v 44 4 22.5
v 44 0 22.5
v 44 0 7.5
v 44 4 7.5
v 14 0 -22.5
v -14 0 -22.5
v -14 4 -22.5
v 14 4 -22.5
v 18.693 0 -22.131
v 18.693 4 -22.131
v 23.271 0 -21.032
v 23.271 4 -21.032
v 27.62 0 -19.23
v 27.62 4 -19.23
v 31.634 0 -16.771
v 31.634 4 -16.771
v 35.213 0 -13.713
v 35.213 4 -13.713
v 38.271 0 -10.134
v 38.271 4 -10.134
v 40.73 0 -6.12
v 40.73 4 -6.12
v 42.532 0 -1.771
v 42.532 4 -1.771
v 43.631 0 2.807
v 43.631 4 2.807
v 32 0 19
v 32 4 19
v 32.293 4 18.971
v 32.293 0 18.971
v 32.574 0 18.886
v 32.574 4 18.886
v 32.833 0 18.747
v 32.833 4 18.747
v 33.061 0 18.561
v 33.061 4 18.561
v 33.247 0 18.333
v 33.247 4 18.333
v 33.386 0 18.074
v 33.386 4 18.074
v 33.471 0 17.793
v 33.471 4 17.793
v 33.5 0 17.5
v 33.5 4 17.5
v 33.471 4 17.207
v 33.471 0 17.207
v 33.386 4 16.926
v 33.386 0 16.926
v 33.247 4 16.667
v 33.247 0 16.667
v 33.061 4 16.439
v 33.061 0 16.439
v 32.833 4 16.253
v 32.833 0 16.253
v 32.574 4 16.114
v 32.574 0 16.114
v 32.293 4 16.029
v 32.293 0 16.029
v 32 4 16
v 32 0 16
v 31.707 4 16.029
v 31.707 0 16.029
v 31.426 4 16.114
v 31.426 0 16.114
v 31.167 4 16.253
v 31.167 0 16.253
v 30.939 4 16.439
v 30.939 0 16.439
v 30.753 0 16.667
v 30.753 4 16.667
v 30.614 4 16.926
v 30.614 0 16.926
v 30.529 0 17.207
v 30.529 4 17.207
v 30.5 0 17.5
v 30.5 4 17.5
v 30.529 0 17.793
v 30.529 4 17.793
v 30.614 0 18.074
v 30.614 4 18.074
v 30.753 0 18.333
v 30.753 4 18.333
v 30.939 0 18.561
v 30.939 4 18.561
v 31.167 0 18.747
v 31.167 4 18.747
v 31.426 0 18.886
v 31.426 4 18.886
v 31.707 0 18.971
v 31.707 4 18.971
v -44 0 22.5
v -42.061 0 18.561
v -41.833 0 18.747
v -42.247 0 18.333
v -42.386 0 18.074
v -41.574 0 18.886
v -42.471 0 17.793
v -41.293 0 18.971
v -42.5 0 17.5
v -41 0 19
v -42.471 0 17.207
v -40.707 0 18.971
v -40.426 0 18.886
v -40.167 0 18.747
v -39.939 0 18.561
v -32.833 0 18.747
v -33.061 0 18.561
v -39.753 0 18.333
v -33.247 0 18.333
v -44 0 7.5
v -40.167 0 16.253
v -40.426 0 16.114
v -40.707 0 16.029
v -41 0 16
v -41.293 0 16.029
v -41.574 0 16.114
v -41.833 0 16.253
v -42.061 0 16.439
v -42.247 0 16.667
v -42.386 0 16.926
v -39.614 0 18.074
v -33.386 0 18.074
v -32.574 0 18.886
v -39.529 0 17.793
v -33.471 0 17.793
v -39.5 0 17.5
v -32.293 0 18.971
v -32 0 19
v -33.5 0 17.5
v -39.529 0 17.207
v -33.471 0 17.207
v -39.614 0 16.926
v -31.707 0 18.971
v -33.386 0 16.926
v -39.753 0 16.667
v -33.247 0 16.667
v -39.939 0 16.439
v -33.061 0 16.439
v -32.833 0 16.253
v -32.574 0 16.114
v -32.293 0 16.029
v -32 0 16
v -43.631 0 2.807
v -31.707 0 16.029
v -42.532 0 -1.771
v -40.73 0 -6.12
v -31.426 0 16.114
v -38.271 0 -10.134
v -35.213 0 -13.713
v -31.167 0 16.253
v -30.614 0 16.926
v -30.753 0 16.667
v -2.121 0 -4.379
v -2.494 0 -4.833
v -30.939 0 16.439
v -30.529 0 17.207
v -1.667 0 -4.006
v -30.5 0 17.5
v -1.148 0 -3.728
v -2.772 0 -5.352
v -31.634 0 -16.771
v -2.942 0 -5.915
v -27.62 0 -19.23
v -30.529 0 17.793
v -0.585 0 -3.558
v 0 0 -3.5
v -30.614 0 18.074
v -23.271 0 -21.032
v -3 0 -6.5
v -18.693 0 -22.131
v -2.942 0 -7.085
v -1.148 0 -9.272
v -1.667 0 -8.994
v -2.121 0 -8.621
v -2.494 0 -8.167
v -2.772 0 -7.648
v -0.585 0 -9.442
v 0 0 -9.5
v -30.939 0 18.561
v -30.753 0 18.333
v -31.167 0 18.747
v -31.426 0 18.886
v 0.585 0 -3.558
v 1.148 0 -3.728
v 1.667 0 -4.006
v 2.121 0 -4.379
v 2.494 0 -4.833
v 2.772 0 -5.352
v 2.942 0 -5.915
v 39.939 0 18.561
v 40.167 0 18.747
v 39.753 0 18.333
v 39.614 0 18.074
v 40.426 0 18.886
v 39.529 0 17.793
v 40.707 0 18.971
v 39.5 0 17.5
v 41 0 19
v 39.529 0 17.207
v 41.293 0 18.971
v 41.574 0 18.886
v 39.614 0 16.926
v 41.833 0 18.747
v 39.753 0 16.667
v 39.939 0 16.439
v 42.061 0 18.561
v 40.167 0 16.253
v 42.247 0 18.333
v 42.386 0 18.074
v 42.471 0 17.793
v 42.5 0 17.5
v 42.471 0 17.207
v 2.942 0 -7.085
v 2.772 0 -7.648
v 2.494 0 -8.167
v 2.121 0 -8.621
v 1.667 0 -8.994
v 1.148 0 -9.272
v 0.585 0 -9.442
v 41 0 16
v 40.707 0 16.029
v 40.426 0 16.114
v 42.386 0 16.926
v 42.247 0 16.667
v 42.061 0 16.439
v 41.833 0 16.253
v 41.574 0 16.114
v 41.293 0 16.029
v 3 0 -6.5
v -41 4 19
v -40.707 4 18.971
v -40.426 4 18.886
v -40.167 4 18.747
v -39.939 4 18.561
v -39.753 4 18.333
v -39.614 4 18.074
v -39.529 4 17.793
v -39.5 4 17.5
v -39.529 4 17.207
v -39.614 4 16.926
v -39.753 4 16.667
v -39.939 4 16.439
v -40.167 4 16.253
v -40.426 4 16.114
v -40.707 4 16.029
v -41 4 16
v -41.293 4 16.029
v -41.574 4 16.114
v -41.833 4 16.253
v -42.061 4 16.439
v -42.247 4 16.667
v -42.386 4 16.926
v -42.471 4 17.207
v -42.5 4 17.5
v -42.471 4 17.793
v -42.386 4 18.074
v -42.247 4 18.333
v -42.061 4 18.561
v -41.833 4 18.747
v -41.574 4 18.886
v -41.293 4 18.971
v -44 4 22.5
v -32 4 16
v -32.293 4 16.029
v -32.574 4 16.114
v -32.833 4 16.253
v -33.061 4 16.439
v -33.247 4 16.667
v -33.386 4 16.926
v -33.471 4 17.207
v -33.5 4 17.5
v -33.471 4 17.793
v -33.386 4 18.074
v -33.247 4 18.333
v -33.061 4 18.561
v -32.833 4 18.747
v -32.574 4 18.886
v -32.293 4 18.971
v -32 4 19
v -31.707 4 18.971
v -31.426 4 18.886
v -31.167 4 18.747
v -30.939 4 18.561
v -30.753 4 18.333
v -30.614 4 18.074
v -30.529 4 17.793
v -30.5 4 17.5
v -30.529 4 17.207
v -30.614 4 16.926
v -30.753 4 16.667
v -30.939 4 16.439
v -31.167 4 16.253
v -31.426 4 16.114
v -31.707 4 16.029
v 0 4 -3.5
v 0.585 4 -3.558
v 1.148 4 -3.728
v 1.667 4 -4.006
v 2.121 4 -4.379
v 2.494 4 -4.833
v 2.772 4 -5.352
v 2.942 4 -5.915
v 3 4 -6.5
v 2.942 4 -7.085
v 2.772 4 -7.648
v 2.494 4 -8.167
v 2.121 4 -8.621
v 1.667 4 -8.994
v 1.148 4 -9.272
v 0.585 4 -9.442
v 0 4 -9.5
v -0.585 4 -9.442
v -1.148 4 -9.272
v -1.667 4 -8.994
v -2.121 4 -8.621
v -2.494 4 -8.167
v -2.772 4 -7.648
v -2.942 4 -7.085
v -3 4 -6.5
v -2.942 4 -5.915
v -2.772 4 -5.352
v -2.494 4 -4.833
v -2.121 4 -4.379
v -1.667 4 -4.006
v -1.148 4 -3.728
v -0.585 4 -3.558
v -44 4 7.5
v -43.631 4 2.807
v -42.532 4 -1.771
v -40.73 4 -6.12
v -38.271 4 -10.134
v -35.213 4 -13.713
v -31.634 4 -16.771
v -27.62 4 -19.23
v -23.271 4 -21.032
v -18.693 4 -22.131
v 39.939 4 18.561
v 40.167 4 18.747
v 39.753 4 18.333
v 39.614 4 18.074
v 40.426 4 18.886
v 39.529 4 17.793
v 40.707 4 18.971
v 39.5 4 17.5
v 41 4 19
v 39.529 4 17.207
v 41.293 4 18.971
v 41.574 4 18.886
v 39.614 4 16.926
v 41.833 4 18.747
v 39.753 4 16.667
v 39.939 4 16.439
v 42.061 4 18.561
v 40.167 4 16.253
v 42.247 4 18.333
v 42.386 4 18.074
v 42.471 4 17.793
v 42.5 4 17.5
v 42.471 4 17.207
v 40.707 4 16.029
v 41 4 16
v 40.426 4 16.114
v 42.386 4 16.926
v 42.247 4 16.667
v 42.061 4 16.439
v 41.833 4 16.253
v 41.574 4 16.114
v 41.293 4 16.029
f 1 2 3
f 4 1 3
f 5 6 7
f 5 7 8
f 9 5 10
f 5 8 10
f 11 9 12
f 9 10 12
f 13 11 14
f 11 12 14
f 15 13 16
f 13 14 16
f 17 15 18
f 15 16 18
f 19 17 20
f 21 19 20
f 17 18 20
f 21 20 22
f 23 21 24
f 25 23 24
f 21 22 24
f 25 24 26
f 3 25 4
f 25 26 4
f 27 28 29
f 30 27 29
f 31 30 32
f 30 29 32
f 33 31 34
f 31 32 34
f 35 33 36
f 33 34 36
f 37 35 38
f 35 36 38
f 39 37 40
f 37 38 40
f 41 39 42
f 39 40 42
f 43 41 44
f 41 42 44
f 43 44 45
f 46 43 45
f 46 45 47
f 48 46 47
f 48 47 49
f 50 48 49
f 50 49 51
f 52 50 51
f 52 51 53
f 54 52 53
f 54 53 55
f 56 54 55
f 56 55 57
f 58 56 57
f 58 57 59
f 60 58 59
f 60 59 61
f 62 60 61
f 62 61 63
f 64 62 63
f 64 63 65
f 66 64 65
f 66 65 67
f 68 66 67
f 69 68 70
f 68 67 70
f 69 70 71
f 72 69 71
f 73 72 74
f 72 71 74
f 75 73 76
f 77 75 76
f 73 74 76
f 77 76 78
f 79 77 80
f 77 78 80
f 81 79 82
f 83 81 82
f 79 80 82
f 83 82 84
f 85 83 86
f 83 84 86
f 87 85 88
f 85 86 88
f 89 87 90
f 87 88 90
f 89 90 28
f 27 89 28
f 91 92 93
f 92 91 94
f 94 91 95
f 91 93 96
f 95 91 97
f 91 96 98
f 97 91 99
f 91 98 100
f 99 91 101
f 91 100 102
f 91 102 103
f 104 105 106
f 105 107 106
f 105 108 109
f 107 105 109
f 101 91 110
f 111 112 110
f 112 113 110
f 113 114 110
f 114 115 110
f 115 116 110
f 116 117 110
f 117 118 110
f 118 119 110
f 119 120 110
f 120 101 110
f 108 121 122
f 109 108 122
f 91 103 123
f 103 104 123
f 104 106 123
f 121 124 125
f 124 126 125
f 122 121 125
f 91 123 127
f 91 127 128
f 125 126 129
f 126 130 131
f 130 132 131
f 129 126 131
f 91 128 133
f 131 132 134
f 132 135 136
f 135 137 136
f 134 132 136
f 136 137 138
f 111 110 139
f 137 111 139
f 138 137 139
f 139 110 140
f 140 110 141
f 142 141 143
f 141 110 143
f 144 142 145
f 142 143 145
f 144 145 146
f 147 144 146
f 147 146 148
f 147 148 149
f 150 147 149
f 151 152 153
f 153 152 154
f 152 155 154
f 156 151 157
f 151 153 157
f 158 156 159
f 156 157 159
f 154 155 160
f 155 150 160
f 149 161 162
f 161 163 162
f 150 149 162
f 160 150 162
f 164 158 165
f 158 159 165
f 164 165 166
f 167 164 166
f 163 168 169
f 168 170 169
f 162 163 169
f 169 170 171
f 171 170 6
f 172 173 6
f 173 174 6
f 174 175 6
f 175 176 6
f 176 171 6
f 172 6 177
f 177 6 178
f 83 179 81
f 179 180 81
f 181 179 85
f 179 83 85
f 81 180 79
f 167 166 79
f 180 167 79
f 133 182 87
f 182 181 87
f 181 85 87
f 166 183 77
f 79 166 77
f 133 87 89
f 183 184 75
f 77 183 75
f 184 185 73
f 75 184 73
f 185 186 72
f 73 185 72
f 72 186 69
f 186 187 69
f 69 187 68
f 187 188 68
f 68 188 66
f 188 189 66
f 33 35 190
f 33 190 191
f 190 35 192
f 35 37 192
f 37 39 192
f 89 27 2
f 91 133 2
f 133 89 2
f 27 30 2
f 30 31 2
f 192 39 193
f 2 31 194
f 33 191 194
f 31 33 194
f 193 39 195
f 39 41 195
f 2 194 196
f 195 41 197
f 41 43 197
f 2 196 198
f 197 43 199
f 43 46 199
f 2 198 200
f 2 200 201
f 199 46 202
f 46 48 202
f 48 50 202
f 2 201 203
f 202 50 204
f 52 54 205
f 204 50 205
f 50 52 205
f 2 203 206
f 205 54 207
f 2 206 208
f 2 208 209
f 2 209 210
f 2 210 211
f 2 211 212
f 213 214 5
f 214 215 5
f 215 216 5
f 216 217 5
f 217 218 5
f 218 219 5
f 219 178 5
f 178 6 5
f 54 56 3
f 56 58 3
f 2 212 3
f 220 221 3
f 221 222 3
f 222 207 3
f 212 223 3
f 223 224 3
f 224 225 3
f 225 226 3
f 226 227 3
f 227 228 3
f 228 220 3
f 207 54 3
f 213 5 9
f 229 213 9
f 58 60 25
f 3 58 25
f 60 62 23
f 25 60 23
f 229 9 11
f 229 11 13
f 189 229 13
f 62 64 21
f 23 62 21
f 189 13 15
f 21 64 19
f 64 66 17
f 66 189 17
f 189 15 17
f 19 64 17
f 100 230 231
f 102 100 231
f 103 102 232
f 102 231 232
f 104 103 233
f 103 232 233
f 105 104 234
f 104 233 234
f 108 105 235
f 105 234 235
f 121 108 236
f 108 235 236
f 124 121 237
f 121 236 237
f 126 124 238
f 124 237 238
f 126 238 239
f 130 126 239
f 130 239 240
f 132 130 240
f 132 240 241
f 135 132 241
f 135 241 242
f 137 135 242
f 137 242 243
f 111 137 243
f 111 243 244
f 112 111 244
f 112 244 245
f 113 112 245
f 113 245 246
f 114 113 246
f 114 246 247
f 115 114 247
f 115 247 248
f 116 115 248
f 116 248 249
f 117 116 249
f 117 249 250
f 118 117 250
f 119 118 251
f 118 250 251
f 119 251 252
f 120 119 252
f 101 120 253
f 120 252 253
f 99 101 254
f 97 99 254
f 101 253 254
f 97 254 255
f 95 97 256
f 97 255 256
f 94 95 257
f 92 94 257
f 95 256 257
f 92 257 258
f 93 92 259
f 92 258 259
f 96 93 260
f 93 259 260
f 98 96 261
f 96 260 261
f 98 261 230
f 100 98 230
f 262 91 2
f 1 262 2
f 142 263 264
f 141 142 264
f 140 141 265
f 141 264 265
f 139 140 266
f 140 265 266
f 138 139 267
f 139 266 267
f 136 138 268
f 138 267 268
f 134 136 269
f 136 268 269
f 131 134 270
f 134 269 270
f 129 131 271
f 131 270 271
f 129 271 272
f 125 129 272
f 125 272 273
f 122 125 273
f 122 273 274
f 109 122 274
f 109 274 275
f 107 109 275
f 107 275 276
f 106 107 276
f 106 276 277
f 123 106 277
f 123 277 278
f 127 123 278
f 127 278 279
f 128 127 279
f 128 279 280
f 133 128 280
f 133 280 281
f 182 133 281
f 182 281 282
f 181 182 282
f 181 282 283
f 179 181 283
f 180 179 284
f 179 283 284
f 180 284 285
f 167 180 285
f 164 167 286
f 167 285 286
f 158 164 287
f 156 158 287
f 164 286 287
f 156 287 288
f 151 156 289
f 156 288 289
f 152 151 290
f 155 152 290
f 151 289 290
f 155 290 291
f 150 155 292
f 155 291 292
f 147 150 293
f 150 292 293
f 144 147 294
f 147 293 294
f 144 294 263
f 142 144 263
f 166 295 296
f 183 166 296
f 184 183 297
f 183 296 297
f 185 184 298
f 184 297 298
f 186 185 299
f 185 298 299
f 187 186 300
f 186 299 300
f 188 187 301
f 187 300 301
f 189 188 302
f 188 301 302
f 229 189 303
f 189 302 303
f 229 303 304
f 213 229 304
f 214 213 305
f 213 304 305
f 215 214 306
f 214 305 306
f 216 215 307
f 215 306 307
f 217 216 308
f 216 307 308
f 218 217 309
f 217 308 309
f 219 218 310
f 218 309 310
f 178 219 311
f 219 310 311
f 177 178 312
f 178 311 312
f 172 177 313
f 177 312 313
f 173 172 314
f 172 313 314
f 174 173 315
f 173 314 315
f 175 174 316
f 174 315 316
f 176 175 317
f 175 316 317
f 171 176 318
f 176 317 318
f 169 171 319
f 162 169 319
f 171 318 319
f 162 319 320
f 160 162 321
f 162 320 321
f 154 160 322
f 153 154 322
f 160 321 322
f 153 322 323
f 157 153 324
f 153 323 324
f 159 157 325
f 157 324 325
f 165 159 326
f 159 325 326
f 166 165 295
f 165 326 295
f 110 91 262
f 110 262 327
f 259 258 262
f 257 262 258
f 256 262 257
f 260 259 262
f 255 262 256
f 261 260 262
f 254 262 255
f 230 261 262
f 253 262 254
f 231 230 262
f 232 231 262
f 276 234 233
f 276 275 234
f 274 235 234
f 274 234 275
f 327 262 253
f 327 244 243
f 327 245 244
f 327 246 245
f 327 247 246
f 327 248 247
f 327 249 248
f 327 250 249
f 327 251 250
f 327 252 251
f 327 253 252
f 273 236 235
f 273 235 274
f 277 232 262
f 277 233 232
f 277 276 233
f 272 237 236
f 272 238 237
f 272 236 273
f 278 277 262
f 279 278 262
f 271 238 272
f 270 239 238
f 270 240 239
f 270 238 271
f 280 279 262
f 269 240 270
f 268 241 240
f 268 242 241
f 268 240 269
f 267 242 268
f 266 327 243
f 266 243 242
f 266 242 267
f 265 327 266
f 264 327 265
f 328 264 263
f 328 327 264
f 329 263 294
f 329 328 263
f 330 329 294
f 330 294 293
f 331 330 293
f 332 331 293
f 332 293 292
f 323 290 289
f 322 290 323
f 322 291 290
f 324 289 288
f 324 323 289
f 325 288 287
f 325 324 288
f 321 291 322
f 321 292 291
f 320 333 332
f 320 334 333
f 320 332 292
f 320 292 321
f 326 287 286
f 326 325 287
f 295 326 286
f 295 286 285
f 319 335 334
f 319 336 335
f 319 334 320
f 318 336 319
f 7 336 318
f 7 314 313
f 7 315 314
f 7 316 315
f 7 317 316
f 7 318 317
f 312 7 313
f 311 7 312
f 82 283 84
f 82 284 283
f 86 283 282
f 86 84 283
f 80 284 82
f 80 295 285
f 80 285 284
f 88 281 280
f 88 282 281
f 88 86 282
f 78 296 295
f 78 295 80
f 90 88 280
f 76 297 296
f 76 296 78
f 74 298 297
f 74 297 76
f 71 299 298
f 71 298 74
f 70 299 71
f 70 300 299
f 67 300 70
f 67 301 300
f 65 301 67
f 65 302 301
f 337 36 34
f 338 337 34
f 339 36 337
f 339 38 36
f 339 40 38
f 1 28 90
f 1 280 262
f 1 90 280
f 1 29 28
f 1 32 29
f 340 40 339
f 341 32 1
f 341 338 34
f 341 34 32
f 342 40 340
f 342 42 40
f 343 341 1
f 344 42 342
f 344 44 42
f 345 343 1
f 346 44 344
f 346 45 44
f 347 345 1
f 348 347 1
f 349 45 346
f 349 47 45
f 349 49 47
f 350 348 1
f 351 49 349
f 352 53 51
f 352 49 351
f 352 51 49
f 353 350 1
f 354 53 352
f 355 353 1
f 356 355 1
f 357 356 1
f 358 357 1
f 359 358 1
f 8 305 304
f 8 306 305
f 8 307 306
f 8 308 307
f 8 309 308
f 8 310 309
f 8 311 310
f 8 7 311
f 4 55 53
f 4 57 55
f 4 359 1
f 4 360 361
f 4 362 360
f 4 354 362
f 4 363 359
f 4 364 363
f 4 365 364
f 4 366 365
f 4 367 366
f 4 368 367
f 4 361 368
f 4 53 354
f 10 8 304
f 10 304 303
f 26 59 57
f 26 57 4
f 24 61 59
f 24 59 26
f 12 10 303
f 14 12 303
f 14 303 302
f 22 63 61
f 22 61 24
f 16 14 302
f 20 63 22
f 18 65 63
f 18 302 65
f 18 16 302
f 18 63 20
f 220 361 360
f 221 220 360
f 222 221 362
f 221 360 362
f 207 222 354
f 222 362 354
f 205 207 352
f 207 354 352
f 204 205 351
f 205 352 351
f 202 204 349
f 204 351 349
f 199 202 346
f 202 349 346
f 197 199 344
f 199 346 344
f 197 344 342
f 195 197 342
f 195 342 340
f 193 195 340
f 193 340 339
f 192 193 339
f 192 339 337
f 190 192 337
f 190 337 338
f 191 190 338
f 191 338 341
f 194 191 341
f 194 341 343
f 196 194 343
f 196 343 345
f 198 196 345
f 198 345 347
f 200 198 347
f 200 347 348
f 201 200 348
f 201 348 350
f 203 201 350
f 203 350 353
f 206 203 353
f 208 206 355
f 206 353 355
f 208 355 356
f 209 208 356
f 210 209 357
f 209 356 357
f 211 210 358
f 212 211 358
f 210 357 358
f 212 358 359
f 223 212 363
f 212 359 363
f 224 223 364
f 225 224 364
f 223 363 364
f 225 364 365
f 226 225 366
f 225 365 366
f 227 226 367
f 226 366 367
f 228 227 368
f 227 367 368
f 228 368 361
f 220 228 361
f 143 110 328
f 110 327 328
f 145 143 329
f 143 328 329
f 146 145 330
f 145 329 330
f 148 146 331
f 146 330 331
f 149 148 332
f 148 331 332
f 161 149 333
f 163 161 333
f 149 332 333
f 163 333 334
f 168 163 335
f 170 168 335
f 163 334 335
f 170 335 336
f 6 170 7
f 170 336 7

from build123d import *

# Parameters (mm, degrees)
SKETCH_1_W          = 88
SKETCH_1_H          = 45
EXTRUDE_1_DEPTH     = 4
SKETCH_2_R          = 3
CUT_EXTRUDE_1_DEPTH = 4
SKETCH_3_R          = 1.5
CUT_EXTRUDE_2_DEPTH = 50.580742229
FILLET_1_R          = 30


with BuildPart() as part:
    # 草图1 → 凸台-拉伸1 (new body)
    with BuildSketch(Plane(origin=(0, 0, 0), x_dir=(1, 0, 0), z_dir=(0, 1, 0))):
        Rectangle(SKETCH_1_W, SKETCH_1_H)
    extrude(amount=EXTRUDE_1_DEPTH)

    # 草图2 → 切除-拉伸1 (cut)
    with BuildSketch(Plane(origin=(0, 4, 0), x_dir=(1, 0, 0), z_dir=(0, 1, 0))):
        with Locations(Location((0, 6.5, 0), (0, 0, 270))):
            Circle(SKETCH_2_R)
    extrude(amount=-CUT_EXTRUDE_1_DEPTH, mode=Mode.SUBTRACT)

    # 草图3 → 切除-拉伸2 (cut, through all)
    with BuildSketch(Plane(origin=(0, 4, 0), x_dir=(1, 0, 0), z_dir=(0, 1, 0))):
        with Locations(Location((-41, -17.5, 0), (0, 0, 270))):
            Circle(SKETCH_3_R)
        with Locations(Location((-32, -17.5, 0), (0, 0, 90))):
            Circle(SKETCH_3_R)
        with Locations(Location((32, -17.5, 0), (0, 0, 270))):
            Circle(SKETCH_3_R)
        with Locations(Location((41, -17.5, 0), (0, 0, 90))):
            Circle(SKETCH_3_R)
    extrude(amount=-CUT_EXTRUDE_2_DEPTH, mode=Mode.SUBTRACT)

    # 圆角1
    fillet_1_edges = [part.edges().sort_by_distance(p)[0] for p in [
        (-44, 2, -22.5),
        (44, 2, -22.5),
    ]]
    fillet(fillet_1_edges, radius=FILLET_1_R)


solid = part.part
